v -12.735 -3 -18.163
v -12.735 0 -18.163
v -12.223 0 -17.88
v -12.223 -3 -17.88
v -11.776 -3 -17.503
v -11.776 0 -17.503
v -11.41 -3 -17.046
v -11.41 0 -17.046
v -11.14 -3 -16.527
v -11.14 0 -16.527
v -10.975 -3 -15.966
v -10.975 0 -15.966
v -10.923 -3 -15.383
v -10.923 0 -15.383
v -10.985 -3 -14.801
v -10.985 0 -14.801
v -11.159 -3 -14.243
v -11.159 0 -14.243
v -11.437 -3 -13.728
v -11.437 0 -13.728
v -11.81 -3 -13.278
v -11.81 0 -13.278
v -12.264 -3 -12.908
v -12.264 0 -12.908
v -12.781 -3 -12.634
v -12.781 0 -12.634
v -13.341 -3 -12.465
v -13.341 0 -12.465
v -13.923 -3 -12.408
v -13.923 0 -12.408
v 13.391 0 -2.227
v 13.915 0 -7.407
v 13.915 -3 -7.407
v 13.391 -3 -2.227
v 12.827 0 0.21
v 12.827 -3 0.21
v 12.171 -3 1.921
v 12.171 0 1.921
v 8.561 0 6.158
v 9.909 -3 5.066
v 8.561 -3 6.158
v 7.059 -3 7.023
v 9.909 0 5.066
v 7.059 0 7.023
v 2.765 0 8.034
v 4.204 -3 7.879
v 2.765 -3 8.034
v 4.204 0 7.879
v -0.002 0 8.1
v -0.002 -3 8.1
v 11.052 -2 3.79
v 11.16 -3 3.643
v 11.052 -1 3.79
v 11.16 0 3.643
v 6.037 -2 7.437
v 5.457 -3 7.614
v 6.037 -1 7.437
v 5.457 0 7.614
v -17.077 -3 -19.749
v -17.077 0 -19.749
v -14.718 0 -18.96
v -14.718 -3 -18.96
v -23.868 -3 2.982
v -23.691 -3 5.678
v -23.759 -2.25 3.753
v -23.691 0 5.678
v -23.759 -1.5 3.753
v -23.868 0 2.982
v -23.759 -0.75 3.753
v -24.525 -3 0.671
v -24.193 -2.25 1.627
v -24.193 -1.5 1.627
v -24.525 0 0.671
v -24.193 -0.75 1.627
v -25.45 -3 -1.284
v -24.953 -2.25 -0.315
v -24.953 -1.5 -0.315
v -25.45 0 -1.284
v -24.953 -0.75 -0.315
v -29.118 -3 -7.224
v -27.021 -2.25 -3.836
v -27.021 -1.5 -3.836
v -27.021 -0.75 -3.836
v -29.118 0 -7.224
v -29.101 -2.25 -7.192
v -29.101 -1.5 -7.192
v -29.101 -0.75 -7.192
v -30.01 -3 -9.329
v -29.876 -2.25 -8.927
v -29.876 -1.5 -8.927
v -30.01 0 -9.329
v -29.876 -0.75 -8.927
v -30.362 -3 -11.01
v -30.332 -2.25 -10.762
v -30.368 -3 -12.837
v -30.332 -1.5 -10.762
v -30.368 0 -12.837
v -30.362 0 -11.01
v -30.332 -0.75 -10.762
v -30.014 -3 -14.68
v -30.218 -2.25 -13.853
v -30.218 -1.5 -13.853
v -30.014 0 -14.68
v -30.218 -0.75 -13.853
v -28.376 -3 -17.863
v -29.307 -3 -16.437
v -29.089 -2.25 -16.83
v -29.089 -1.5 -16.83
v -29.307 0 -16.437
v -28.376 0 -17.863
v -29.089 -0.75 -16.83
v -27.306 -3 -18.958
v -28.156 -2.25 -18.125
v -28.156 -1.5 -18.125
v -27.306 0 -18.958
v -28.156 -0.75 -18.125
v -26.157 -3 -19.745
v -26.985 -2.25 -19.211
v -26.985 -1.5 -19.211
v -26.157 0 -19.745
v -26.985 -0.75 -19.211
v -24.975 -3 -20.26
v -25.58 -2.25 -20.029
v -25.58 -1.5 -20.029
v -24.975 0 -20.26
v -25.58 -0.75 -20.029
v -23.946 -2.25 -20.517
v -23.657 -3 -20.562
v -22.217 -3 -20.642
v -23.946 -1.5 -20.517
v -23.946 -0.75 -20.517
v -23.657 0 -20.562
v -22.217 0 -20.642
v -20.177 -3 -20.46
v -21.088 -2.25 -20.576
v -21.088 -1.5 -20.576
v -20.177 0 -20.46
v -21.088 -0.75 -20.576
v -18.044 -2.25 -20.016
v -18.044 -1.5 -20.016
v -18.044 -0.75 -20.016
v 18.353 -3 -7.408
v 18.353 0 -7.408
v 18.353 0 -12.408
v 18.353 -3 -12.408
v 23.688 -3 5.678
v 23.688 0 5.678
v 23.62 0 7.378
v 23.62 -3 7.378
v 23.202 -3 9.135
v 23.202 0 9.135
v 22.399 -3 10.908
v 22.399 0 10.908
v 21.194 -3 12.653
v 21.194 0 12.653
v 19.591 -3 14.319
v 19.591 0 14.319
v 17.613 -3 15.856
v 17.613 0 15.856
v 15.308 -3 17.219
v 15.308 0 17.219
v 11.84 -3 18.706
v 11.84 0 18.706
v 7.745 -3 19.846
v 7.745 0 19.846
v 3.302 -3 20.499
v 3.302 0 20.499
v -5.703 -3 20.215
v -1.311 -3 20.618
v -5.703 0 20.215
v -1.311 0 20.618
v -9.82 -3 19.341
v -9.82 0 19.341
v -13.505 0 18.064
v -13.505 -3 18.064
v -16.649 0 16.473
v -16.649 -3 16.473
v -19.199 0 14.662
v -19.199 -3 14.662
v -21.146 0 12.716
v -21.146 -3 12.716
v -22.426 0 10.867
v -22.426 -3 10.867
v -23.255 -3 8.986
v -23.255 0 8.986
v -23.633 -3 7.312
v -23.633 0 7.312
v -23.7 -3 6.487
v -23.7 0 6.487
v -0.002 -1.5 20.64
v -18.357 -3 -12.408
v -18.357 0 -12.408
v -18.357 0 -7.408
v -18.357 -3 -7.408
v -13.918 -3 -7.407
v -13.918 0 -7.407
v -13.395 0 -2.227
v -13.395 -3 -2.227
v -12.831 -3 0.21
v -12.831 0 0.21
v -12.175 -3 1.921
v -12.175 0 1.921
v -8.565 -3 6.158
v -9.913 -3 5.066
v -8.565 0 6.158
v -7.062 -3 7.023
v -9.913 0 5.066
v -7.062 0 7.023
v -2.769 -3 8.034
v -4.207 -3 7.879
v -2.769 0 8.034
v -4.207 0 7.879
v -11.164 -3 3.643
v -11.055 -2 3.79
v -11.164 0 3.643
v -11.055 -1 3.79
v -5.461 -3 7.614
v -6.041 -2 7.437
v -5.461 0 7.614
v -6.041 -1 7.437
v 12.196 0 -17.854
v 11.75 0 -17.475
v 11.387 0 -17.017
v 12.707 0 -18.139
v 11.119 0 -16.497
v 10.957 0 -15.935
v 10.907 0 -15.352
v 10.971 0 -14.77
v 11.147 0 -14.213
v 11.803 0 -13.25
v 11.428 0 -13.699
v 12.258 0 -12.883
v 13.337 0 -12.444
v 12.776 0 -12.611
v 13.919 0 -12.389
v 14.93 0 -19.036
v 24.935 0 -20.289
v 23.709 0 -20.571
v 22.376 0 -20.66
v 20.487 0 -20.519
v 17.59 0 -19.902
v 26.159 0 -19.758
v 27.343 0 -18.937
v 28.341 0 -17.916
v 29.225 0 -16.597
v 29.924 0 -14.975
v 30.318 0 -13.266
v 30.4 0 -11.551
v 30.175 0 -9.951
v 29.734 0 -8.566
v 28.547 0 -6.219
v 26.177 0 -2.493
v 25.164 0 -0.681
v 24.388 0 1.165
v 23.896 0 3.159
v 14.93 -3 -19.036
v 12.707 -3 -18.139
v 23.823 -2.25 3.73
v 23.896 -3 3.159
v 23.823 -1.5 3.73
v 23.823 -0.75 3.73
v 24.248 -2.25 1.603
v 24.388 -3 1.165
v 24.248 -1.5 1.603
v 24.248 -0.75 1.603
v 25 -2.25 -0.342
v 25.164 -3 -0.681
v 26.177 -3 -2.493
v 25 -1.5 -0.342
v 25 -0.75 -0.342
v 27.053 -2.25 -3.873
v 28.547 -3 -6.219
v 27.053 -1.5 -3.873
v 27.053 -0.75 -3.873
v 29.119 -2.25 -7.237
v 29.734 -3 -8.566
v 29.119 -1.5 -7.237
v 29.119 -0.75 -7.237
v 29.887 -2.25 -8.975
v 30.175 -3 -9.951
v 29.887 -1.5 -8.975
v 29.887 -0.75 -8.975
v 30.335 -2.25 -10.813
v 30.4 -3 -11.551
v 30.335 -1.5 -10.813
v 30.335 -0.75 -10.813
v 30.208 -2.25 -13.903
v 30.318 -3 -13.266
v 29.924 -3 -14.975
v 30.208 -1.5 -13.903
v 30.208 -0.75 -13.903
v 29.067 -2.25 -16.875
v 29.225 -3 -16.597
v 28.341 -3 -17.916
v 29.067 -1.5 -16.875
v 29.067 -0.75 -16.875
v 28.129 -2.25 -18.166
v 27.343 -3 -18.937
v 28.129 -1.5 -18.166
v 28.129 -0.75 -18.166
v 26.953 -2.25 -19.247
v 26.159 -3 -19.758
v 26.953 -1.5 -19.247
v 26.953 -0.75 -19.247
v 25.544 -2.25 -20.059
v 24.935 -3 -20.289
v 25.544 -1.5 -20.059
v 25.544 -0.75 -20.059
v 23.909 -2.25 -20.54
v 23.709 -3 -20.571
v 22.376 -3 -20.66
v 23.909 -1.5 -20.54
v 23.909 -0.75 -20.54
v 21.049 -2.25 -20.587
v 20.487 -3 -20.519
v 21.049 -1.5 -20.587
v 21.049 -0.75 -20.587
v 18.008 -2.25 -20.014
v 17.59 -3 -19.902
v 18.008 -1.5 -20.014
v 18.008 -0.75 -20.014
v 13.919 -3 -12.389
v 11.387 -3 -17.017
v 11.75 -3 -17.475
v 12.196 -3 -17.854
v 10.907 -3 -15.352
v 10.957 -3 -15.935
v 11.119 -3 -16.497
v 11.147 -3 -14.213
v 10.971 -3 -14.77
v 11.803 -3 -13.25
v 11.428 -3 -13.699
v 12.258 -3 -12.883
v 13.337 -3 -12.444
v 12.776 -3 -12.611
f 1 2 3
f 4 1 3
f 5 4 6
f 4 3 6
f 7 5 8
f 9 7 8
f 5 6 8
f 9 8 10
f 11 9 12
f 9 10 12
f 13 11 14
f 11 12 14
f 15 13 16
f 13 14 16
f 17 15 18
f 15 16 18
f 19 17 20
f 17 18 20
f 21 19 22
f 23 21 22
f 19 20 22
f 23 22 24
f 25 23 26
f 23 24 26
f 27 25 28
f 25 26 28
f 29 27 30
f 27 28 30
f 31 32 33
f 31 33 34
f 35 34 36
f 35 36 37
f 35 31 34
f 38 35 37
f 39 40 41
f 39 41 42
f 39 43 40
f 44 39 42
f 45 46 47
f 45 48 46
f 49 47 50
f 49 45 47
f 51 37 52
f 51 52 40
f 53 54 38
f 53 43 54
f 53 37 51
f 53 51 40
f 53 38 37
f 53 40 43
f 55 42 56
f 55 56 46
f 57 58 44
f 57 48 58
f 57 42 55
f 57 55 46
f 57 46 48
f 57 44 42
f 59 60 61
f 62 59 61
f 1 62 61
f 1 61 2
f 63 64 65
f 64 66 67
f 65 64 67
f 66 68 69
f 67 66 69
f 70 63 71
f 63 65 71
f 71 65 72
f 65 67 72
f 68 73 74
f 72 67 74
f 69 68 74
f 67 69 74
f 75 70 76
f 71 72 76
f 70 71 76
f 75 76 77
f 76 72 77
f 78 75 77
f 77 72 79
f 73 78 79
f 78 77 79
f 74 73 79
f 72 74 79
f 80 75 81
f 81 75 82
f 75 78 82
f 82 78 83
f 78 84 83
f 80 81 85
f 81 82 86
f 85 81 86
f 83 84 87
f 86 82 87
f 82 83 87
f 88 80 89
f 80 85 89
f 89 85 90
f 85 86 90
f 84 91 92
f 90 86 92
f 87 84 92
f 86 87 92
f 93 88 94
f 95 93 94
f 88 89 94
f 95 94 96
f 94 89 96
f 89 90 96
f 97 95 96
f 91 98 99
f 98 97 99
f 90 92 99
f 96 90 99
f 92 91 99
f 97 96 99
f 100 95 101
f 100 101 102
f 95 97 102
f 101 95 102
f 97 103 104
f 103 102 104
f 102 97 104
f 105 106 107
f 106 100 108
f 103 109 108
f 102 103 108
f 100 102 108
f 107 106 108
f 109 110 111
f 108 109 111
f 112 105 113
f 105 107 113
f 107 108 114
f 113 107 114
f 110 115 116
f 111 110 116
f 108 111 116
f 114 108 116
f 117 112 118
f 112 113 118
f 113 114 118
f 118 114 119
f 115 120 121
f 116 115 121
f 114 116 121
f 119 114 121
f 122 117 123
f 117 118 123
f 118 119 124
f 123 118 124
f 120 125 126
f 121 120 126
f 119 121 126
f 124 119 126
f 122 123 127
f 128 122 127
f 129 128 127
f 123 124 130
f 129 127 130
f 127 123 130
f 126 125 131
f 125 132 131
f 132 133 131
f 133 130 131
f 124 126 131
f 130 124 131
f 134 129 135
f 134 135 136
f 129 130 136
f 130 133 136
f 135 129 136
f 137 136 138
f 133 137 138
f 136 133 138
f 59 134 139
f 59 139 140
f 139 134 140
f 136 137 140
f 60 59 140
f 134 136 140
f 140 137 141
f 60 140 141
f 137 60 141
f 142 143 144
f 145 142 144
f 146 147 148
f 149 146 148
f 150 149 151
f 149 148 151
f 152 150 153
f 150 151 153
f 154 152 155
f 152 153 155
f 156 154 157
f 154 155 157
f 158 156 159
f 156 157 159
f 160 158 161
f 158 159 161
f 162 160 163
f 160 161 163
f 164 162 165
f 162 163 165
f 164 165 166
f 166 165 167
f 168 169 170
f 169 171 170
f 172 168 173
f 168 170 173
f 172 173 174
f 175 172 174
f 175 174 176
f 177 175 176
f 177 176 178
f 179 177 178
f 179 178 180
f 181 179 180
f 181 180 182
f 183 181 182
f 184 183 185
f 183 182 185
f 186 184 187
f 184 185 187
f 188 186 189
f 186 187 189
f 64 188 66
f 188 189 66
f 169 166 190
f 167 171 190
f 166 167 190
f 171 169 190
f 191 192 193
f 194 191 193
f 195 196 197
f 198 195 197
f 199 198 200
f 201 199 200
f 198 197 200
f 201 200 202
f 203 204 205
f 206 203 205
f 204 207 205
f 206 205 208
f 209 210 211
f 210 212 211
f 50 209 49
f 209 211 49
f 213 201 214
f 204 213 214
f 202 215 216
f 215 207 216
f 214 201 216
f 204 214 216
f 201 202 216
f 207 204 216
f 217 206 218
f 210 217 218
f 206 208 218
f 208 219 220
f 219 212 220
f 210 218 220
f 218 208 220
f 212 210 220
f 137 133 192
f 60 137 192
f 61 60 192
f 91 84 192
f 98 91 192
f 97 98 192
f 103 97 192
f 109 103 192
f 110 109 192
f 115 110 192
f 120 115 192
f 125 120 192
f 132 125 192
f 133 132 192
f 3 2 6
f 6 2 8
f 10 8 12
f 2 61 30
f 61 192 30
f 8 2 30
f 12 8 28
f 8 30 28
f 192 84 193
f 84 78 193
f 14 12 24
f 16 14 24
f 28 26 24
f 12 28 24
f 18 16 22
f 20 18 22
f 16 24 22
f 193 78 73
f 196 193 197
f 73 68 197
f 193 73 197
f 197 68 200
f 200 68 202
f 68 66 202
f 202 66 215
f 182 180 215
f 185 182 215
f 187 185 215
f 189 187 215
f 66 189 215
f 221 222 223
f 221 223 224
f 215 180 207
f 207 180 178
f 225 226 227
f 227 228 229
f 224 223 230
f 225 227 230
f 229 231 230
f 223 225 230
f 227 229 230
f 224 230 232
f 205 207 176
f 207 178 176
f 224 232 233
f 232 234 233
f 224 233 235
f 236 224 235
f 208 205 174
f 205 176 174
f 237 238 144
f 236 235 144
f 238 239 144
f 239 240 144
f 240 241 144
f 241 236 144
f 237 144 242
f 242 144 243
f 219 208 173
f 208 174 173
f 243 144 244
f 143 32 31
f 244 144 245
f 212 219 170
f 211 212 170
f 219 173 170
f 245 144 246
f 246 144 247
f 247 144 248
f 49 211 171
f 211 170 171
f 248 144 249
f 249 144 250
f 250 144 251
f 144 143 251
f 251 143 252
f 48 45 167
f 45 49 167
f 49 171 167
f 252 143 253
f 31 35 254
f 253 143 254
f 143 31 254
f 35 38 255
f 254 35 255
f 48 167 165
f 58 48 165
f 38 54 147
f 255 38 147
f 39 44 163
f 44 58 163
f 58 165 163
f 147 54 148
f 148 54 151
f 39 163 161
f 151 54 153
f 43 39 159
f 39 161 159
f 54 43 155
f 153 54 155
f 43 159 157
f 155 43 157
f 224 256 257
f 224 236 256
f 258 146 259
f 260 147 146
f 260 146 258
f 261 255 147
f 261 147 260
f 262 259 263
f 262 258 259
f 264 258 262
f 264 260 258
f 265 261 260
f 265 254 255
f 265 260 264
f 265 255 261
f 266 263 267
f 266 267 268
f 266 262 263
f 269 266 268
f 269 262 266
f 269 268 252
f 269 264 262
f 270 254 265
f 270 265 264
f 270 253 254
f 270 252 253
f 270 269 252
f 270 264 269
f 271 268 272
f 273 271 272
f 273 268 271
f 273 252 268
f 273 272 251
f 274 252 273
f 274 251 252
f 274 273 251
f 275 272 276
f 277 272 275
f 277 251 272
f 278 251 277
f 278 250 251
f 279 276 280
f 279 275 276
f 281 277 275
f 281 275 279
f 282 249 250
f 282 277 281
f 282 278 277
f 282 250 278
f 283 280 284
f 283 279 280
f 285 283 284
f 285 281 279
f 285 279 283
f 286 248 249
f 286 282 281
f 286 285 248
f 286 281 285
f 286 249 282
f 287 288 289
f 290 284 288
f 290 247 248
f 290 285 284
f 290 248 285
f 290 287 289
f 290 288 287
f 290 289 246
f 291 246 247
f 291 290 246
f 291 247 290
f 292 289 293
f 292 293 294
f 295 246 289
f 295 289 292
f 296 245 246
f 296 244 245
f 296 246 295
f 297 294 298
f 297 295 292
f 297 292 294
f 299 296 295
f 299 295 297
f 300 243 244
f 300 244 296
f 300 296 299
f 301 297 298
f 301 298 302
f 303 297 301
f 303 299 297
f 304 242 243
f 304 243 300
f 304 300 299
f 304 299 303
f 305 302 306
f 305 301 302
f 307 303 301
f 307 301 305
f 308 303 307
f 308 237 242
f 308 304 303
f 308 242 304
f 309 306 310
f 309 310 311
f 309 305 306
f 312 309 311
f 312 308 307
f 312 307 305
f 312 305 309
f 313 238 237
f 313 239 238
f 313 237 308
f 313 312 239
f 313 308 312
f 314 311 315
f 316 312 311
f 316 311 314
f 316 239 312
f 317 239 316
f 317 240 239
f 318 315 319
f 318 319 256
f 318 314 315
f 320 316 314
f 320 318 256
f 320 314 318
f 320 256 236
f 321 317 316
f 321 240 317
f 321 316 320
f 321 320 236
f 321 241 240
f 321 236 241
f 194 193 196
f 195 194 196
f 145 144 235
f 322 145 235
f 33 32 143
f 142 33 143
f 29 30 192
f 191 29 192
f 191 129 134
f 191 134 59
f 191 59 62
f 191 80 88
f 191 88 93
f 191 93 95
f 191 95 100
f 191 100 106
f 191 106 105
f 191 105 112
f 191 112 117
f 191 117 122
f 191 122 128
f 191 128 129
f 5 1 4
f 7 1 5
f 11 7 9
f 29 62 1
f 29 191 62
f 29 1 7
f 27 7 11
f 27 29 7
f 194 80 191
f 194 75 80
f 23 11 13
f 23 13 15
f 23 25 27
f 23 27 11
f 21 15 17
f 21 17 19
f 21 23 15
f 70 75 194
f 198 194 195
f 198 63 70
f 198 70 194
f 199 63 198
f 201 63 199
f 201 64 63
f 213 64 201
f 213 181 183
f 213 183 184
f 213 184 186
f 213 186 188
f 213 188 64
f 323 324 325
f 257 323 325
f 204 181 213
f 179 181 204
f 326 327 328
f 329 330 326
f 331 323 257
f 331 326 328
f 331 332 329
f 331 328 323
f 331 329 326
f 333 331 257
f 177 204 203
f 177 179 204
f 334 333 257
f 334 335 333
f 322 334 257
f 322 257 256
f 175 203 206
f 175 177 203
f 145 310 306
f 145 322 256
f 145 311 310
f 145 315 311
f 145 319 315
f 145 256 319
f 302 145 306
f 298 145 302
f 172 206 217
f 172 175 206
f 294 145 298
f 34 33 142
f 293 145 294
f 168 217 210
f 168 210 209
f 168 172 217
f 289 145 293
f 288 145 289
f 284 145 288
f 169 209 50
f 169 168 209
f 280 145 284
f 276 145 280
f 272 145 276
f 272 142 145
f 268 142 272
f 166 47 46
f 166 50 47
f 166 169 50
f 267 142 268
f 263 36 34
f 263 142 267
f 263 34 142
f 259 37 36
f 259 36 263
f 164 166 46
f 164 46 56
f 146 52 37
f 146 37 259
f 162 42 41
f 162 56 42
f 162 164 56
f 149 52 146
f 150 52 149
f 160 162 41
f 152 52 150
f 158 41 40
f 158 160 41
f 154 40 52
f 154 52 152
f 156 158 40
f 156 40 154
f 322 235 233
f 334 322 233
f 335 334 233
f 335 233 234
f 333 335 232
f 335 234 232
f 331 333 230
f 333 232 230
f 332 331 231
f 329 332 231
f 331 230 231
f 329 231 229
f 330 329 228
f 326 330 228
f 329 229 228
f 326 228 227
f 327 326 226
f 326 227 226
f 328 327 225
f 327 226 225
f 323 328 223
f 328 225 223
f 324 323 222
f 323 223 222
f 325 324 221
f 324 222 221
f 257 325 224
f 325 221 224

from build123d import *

# Parameters (mm, degrees)
F1_DEPTH = 3


# Not quite as in the source:
# - ends of sketch curves that miss each other by under 0.0002 mm in the source are joined
# - the dataset's text gives a spline's control points without its knots; the knots are read off the source's solid


with BuildPart() as f1:
    # F0 (on Front) → F1 (new body)
    with BuildSketch(Plane.XZ):
        with BuildLine():
            Line((-13.923003, -12.408035), (-18.356865, -12.408035))
            Line((-18.356865, -12.408035), (-18.356865, -7.408035))
            Line((-18.356865, -7.408035), (-13.918449, -7.407196))
            add(Edge.make_bspline(
                [(-13.918449, -7.407196), (-13.638513, -3.334265), (-13.208401, 2.923662), (-6.220814, 8.085581), (-2.060784, 8.094994), (-0.001865, 8.099652)],
                knots=[0, 0, 0, 0, 11.557339, 17.757478, 23.833112, 23.833112, 23.833112, 23.833112], degree=3))
            add(Edge.make_bspline(
                [(13.914719, -7.407196), (13.634783, -3.334265), (13.20467, 2.923662), (6.217083, 8.085581), (2.057053, 8.094994), (-0.001865, 8.099652)],
                knots=[0, 0, 0, 0, 11.557339, 17.757478, 23.833112, 23.833112, 23.833112, 23.833112], degree=3))
            Line((13.914719, -7.407196), (18.353135, -7.408035))
            Line((18.353135, -7.408035), (18.353135, -12.408035))
            Line((18.353135, -12.408035), (13.919311, -12.389395))
            ThreePointArc((13.919311, -12.389395), (10.9712332753, -14.7704659552), (12.7070690482, -18.1390758896))
            add(Edge.make_bspline(
                [(23.687616, 5.678493), (23.745513, 5.327843), (23.739909, -1.770351), (33.780162, -8.494813), (26.825149, -23.514858), (15.452431, -19.33681), (12.7070690482, -18.1390758896)],
                knots=[26.688985, 26.688985, 26.688985, 26.688985, 28.557776, 42.872008, 54.1154, 62.665306, 62.665306, 62.665306, 62.665306], degree=3))
            add(Edge.make_bspline(
                [(23.687616, 5.678493), (24.5393769355, 20.6396499944), (-0.0018618243, 20.639652), (-24.5431005841, 20.6396540056), (-23.6913461529, 5.6784965777)],
                knots=[6.248471, 6.248471, 6.248471, 7.8539815, 7.8539815, 9.459492, 9.459492, 9.459492], degree=2, weights=[1, 0.694727572, 1, 0.694727572, 1]))
            add(Edge.make_bspline(
                [(-23.6913461529, 5.6784965777), (-23.674634, 5.350356), (-23.698871, -1.747799), (-33.767305, -8.429992), (-26.875499, -23.479143), (-15.485316, -19.348943), (-12.734943, -18.162761)],
                knots=[26.688985, 26.688985, 26.688985, 26.688985, 28.557776, 42.872008, 54.1154, 62.665306, 62.665306, 62.665306, 62.665306], degree=3))
            ThreePointArc((-12.734943, -18.162761), (-10.9849613794, -14.8014779657), (-13.923003, -12.408035))
        make_face()
    extrude(amount=F1_DEPTH)


solid = f1.part
